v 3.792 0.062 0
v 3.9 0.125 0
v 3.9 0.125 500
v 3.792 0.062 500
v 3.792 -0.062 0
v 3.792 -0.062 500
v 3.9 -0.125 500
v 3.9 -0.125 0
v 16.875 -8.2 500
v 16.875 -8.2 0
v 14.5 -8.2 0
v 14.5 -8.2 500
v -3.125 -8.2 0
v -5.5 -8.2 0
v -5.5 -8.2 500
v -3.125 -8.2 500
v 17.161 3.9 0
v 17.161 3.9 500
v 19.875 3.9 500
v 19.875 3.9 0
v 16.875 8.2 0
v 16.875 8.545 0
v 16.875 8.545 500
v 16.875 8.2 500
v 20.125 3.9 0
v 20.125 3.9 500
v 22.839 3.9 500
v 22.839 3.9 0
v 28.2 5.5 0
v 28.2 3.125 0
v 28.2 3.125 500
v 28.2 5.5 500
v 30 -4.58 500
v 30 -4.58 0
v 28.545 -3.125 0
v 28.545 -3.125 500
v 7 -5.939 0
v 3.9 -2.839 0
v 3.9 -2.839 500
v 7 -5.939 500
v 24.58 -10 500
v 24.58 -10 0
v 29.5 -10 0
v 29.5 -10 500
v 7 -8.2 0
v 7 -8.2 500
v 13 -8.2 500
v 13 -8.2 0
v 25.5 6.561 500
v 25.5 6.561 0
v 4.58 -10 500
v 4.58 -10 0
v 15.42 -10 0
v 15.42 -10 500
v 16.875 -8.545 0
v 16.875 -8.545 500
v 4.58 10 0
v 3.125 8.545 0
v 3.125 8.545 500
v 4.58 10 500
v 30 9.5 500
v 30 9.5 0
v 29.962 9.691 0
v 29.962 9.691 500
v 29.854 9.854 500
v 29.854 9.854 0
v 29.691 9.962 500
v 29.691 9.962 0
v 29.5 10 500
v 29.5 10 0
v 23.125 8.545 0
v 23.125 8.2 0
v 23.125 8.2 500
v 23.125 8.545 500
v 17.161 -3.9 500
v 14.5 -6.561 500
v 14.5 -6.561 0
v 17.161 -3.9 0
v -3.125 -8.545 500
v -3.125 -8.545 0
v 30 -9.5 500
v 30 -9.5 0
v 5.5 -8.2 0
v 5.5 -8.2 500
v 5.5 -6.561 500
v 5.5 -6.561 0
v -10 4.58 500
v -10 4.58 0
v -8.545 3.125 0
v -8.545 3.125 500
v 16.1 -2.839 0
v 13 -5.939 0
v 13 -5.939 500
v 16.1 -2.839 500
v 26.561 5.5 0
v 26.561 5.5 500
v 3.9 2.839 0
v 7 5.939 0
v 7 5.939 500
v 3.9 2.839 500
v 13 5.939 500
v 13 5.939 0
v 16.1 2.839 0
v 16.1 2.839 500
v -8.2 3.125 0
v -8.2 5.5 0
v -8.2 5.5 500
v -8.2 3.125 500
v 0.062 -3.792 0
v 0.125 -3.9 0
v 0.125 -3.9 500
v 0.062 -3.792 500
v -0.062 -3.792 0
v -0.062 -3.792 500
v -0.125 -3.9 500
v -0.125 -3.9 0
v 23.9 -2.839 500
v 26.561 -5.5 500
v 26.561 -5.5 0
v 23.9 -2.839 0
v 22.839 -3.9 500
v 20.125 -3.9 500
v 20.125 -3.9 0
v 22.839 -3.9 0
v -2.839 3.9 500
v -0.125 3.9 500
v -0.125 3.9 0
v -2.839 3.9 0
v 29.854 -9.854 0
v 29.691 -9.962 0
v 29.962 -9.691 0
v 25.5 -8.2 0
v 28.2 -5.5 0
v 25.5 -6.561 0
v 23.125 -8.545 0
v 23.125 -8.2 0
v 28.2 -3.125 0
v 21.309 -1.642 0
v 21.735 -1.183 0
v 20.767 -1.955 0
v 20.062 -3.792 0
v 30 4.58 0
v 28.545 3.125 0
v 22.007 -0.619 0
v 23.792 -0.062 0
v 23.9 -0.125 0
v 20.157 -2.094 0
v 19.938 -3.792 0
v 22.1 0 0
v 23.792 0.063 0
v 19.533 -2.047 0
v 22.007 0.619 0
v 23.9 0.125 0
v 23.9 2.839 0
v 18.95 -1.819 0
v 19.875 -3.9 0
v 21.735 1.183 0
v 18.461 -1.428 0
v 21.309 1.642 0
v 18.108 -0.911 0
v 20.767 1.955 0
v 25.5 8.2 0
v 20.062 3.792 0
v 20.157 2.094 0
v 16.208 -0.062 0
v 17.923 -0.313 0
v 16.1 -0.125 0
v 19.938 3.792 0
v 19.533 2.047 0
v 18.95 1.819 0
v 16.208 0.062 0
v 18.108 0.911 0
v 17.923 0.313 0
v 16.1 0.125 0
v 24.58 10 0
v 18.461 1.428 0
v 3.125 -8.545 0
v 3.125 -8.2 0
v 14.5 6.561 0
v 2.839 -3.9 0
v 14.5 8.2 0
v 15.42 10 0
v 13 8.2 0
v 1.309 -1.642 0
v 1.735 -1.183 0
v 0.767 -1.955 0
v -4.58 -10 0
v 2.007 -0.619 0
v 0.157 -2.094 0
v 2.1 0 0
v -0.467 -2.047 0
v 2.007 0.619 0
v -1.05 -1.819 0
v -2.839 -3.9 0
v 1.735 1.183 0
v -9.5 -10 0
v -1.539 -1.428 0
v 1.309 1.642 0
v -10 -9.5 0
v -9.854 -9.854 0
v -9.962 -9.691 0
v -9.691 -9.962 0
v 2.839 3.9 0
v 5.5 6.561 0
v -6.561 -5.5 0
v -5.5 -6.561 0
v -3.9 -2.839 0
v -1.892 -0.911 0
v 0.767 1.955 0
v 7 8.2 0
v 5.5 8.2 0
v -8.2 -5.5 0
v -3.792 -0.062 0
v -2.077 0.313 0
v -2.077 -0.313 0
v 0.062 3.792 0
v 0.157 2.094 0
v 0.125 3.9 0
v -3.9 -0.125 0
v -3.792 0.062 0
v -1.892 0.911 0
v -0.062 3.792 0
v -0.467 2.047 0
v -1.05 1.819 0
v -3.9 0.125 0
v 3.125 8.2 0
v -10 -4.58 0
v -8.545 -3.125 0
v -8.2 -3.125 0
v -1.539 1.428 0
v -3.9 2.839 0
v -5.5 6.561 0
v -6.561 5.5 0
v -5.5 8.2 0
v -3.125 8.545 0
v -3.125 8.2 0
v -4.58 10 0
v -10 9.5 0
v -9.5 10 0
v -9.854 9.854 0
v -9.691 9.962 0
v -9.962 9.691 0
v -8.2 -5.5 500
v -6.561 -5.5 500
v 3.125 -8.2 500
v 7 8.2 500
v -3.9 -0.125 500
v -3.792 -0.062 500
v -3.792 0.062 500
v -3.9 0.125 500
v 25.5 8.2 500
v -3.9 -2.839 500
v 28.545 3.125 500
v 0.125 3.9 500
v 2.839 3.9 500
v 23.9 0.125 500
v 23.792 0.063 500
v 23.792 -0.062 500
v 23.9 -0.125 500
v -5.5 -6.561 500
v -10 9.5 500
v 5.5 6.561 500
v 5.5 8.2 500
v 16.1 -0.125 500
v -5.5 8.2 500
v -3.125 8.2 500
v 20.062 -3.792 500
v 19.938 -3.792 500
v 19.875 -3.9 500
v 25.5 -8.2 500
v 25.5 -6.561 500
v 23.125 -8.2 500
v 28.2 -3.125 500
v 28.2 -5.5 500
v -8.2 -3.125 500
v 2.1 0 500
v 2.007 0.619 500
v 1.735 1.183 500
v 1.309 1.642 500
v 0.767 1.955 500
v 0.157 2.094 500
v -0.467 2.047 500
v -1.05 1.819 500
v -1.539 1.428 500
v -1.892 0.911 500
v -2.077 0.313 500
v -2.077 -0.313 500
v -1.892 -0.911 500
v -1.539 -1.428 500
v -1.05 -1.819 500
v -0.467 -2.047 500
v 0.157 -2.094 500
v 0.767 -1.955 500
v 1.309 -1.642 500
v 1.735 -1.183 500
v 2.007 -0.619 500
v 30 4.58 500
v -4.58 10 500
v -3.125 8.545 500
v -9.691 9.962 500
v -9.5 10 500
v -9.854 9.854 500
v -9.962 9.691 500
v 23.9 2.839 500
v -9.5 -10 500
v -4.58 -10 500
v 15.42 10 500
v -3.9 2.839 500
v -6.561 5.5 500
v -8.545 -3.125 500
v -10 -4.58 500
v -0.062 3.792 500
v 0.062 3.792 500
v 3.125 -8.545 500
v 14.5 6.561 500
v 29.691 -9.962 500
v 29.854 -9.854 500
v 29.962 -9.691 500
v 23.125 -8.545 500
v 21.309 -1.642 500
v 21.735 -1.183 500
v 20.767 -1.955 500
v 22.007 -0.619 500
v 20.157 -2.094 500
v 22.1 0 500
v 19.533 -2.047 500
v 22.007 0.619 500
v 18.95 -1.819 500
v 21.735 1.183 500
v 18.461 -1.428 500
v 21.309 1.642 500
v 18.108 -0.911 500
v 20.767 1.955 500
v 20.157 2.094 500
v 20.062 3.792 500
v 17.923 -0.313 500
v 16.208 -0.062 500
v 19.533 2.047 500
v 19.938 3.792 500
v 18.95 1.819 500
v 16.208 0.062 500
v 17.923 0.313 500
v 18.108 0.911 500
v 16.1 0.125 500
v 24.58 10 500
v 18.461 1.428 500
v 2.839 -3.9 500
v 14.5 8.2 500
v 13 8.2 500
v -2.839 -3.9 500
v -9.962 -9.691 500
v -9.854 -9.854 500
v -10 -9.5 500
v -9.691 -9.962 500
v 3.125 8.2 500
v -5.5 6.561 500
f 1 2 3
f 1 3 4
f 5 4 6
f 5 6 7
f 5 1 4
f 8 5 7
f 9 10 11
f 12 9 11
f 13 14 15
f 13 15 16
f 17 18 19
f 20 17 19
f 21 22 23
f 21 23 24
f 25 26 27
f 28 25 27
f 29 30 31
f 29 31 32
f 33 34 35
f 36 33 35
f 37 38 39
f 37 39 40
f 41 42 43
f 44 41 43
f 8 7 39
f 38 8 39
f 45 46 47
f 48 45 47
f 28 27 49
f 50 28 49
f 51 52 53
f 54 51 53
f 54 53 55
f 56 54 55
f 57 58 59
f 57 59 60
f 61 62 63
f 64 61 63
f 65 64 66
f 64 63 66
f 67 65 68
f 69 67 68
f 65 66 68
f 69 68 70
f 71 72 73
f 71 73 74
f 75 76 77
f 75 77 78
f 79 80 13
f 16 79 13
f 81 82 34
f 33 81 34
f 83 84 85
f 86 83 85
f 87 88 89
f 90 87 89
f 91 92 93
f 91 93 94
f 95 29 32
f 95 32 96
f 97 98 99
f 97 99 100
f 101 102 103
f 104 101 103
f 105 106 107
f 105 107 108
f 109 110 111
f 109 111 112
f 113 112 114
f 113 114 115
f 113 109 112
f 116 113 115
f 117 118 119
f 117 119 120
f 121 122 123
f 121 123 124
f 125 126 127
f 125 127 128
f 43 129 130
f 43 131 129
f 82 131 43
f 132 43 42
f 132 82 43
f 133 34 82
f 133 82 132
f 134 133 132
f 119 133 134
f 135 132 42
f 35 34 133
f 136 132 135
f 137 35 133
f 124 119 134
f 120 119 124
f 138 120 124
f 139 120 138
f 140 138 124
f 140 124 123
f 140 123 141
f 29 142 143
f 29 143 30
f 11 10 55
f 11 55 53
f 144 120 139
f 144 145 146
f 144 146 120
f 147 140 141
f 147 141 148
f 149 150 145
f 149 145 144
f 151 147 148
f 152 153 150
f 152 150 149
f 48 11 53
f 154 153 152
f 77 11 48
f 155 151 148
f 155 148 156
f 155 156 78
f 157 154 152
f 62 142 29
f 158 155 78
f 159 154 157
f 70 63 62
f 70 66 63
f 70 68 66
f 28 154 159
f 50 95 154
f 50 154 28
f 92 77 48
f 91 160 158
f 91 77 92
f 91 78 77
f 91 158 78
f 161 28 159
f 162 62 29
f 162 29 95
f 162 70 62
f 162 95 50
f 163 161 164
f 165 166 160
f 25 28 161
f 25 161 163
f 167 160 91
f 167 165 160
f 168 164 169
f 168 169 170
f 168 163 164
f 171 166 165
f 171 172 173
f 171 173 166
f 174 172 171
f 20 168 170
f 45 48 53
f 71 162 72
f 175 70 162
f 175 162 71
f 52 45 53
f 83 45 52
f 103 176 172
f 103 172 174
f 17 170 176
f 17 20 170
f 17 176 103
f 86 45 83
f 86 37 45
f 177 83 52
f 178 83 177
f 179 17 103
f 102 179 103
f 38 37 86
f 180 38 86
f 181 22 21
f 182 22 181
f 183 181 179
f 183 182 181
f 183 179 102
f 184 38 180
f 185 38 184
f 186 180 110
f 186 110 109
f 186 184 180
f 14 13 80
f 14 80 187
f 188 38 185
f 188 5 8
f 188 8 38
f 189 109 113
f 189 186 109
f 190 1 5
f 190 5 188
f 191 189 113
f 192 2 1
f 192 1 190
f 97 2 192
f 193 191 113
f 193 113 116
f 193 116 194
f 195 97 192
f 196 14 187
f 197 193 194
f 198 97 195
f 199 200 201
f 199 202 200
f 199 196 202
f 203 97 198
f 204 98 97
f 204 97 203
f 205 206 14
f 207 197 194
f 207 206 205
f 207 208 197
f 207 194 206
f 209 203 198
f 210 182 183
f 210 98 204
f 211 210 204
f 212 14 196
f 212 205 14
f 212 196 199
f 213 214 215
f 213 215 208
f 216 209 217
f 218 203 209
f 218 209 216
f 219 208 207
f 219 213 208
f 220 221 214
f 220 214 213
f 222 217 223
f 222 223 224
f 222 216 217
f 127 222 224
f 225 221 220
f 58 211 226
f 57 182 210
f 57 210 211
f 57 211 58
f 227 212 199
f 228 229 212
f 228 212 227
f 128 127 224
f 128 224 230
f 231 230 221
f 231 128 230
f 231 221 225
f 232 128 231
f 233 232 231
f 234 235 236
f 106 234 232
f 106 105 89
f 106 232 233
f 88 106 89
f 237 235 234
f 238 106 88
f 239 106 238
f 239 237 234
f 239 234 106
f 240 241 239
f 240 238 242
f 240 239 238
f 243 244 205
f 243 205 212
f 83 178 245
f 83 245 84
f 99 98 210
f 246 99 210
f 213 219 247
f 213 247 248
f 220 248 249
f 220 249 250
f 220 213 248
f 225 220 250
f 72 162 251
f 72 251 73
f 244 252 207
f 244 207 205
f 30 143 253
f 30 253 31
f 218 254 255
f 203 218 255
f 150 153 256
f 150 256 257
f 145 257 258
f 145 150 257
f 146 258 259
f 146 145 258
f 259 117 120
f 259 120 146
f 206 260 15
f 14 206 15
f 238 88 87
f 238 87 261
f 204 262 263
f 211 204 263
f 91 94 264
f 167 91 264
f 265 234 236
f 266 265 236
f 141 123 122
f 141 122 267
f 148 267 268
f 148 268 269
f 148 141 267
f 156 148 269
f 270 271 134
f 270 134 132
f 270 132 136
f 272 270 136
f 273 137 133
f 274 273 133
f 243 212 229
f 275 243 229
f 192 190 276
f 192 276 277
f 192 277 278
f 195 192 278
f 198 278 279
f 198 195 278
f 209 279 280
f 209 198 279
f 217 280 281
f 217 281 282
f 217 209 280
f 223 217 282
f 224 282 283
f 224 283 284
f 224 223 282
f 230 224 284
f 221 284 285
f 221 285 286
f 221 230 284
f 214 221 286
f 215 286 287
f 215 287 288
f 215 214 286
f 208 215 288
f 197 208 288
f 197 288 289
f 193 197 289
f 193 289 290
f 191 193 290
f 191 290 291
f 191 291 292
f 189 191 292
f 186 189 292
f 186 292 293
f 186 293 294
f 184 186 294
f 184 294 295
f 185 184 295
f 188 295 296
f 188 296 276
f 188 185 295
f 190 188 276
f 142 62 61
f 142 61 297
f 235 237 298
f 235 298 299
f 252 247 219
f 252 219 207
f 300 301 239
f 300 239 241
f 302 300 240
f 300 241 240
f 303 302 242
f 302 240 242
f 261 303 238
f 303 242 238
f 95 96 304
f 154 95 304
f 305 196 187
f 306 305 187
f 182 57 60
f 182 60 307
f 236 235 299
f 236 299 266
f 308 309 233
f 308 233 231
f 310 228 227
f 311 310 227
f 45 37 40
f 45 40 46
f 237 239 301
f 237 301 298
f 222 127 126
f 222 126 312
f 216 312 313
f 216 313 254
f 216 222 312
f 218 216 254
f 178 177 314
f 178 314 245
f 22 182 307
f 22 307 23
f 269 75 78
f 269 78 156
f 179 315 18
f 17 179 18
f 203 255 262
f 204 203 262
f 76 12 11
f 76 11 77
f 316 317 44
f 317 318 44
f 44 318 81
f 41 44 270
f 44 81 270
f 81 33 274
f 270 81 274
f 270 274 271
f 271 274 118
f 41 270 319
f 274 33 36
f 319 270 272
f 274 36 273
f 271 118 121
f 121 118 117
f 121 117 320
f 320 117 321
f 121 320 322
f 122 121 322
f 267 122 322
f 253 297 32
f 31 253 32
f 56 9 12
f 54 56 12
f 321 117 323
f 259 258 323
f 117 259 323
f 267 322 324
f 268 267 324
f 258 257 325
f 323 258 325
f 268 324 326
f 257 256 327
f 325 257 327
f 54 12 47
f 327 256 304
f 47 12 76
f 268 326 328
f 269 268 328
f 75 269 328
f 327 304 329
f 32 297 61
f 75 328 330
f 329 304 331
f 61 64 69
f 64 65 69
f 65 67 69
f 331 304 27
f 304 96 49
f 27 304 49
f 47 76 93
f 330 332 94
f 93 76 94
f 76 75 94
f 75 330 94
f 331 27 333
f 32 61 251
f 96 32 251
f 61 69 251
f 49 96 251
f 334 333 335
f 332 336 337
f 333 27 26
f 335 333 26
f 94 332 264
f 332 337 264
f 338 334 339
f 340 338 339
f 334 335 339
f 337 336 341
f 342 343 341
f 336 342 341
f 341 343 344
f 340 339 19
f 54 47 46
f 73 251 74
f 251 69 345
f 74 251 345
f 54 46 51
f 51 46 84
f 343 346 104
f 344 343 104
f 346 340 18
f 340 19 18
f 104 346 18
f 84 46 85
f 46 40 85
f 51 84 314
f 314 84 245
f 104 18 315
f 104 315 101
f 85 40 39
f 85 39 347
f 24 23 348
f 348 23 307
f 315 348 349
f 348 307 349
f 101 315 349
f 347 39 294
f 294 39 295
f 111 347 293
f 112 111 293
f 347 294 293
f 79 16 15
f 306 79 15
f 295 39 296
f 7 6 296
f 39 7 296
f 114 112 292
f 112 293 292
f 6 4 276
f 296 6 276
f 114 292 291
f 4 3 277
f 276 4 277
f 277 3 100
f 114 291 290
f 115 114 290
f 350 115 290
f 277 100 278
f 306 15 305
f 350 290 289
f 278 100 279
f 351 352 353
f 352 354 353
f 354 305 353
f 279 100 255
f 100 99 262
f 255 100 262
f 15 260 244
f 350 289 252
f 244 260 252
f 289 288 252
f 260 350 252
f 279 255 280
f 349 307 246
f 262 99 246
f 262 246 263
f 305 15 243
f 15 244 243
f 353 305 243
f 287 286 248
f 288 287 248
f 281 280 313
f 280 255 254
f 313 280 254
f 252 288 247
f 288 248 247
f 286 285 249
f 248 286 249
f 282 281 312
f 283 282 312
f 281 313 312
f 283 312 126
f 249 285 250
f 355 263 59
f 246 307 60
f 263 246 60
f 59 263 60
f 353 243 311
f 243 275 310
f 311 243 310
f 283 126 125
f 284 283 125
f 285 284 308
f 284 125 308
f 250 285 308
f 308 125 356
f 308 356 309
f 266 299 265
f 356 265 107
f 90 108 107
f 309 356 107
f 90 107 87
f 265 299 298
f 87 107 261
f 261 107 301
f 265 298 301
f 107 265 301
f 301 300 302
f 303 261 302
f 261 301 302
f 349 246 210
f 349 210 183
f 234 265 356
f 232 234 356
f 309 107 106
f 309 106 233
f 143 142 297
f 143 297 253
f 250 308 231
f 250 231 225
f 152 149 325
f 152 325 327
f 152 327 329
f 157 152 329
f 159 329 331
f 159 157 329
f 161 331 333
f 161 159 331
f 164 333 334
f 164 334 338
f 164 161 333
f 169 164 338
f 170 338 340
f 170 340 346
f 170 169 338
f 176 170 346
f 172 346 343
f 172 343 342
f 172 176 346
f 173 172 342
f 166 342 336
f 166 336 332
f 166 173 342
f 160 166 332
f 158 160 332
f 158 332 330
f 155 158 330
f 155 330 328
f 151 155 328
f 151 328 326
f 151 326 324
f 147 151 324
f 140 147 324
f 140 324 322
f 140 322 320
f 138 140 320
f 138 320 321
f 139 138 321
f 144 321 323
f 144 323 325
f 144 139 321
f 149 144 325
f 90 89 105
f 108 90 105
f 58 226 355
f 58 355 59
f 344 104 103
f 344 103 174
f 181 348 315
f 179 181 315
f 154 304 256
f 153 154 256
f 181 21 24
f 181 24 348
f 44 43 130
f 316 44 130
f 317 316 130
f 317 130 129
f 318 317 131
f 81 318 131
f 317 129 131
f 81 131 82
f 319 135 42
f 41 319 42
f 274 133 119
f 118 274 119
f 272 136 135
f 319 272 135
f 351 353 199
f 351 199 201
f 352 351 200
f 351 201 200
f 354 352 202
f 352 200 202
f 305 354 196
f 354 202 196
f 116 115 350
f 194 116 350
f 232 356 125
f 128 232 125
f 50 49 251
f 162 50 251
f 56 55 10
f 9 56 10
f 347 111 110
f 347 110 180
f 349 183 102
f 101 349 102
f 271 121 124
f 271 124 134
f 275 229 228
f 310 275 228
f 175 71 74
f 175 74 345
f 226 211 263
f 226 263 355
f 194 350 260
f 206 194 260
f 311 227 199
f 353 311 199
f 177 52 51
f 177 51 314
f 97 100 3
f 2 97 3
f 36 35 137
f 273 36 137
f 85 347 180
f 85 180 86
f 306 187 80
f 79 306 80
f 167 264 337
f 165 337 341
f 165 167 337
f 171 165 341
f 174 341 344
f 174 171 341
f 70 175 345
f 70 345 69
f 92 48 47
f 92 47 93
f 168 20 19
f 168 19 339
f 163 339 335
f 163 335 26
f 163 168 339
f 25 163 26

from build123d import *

# Parameters (mm, degrees)
SKETCH_R  = 2.1
PAD_DEPTH = 500


with BuildPart() as part:
    # Sketch → Pad (new body)
    with BuildSketch(Plane.XY):
        with BuildLine():
            Line((-10, 4.58), (-10, 9.5))
            ThreePointArc((-9.5, 10), (-9.853553, 9.853553), (-10, 9.5))
            Line((-9.5, 10), (-4.58, 10))
            Line((-4.58, 10), (-3.125, 8.545))
            Line((-3.125, 8.545), (-3.125, 8.2))
            Line((-5.5, 8.2), (-3.125, 8.2))
            Line((-5.5, 8.2), (-5.5, 6.56066))
            Line((-5.5, 6.56066), (-2.83934, 3.9))
            Line((-0.125, 3.9), (-2.83934, 3.9))
            ThreePointArc((-0.125, 3.9), (0, 3.775), (0.125, 3.9))
            Line((0.125, 3.9), (2.83934, 3.9))
            Line((2.83934, 3.9), (5.5, 6.56066))
            Line((5.5, 6.56066), (5.5, 8.2))
            Line((5.5, 8.2), (3.125, 8.2))
            Line((3.125, 8.2), (3.125, 8.545))
            Line((3.125, 8.545), (4.58, 10))
            Line((4.58, 10), (15.42, 10))
            Line((15.42, 10), (16.875, 8.545))
            Line((16.875, 8.545), (16.875, 8.2))
            Line((16.875, 8.2), (14.5, 8.2))
            Line((14.5, 8.2), (14.5, 6.56066))
            Line((14.5, 6.56066), (17.16066, 3.9))
            Line((17.16066, 3.9), (19.875, 3.9))
            ThreePointArc((19.875, 3.9), (20, 3.775), (20.125, 3.9))
            Line((20.125, 3.9), (22.83934, 3.9))
            Line((22.83934, 3.9), (25.5, 6.56066))
            Line((25.5, 6.56066), (25.5, 8.2))
            Line((25.5, 8.2), (23.125, 8.2))
            Line((23.125, 8.2), (23.125, 8.545))
            Line((23.125, 8.545), (24.58, 10))
            Line((24.58, 10), (29.5, 10))
            ThreePointArc((30, 9.5), (29.853554, 9.853554), (29.5, 10))
            Line((30, 9.5), (30, 4.58))
            Line((30, 4.58), (28.545, 3.125))
            Line((28.545, 3.125), (28.2, 3.125))
            Line((28.2, 3.125), (28.2, 5.5))
            Line((28.2, 5.5), (26.560661, 5.5))
            Line((26.560661, 5.5), (23.9, 2.83934))
            Line((23.9, 2.83934), (23.9, 0.125))
            ThreePointArc((23.9, 0.125), (23.775, 2e-06), (23.899997, -0.125))
            Line((23.899997, -2.83934), (23.899997, -0.125))
            Line((26.560658, -5.5), (23.899997, -2.83934))
            Line((28.199997, -5.5), (26.560658, -5.5))
            Line((28.199997, -3.125), (28.199997, -5.5))
            Line((28.544997, -3.125), (28.199997, -3.125))
            Line((29.999997, -4.58), (28.544997, -3.125))
            Line((29.999997, -9.5), (29.999997, -4.58))
            ThreePointArc((29.5, -10), (29.853552, -9.853552), (29.999997, -9.5))
            Line((24.58, -10), (29.5, -10))
            Line((23.125, -8.545), (24.58, -10))
            Line((23.125, -8.2), (23.125, -8.545))
            Line((25.5, -8.2), (23.125, -8.2))
            Line((25.5, -6.56066), (25.5, -8.2))
            Line((22.83934, -3.9), (25.5, -6.56066))
            Line((20.125, -3.9), (22.83934, -3.9))
            ThreePointArc((20.125, -3.9), (20, -3.775), (19.875, -3.9))
            Line((17.16066, -3.9), (19.875, -3.9))
            Line((14.5, -6.56066), (17.16066, -3.9))
            Line((14.5, -8.2), (14.5, -6.56066))
            Line((16.875, -8.2), (14.5, -8.2))
            Line((16.875, -8.545), (16.875, -8.2))
            Line((15.42, -10), (16.875, -8.545))
            Line((4.58, -10), (15.42, -10))
            Line((4.58, -10), (3.125, -8.545))
            Line((3.125, -8.545), (3.125, -8.2))
            Line((3.125, -8.2), (5.5, -8.2))
            Line((5.5, -8.2), (5.5, -6.56066))
            Line((2.83934, -3.9), (5.5, -6.56066))
            Line((0.125, -3.9), (2.83934, -3.9))
            ThreePointArc((0.125, -3.9), (0, -3.775), (-0.125, -3.9))
            Line((-0.125, -3.9), (-2.83934, -3.9))
            Line((-2.83934, -3.9), (-5.5, -6.56066))
            Line((-5.5, -6.56066), (-5.5, -8.2))
            Line((-5.5, -8.2), (-3.125, -8.2))
            Line((-3.125, -8.545), (-3.125, -8.2))
            Line((-4.58, -10), (-3.125, -8.545))
            Line((-9.5, -10), (-4.58, -10))
            ThreePointArc((-10, -9.5), (-9.853553, -9.853553), (-9.5, -10))
            Line((-10, -4.58), (-10, -9.5))
            Line((-8.545, -3.125), (-10, -4.58))
            Line((-8.2, -3.125), (-8.545, -3.125))
            Line((-8.2, -5.5), (-8.2, -3.125))
            Line((-6.56066, -5.5), (-8.2, -5.5))
            Line((-3.9, -2.83934), (-6.56066, -5.5))
            Line((-3.9, -0.125), (-3.9, -2.83934))
            ThreePointArc((-3.9, -0.125), (-3.775, 0), (-3.9, 0.125))
            Line((-3.9, 2.83934), (-3.9, 0.125))
            Line((-6.56066, 5.5), (-3.9, 2.83934))
            Line((-8.2, 5.5), (-6.56066, 5.5))
            Line((-8.2, 5.5), (-8.2, 3.125))
            Line((-8.545, 3.125), (-8.2, 3.125))
            Line((-10, 4.58), (-8.545, 3.125))
        make_face()
        Circle(SKETCH_R, mode=Mode.SUBTRACT)
        with Locations((20, 0)):
            Circle(SKETCH_R, mode=Mode.SUBTRACT)
        with BuildLine():
            Line((7, 5.93934), (3.9, 2.83934))
            Line((3.9, 2.83934), (3.9, 0.125))
            ThreePointArc((3.9, 0.125), (3.775, 0), (3.9, -0.125))
            Line((3.9, -0.125), (3.9, -2.83934))
            Line((3.9, -2.83934), (7, -5.93934))
            Line((7, -5.93934), (7, -8.2))
            Line((7, -8.2), (13, -8.2))
            Line((13, -8.2), (13, -5.93934))
            Line((13, -5.93934), (16.1, -2.83934))
            Line((16.1, -2.83934), (16.1, -0.125))
            ThreePointArc((16.1, -0.125), (16.224999, 0), (16.1, 0.125))
            Line((16.1, 2.83934), (16.1, 0.125))
            Line((13, 5.93934), (16.1, 2.83934))
            Line((13, 8.2), (13, 5.93934))
            Line((7, 8.2), (13, 8.2))
            Line((7, 5.93934), (7, 8.2))
        make_face(mode=Mode.SUBTRACT)
    extrude(amount=PAD_DEPTH)


solid = part.part
